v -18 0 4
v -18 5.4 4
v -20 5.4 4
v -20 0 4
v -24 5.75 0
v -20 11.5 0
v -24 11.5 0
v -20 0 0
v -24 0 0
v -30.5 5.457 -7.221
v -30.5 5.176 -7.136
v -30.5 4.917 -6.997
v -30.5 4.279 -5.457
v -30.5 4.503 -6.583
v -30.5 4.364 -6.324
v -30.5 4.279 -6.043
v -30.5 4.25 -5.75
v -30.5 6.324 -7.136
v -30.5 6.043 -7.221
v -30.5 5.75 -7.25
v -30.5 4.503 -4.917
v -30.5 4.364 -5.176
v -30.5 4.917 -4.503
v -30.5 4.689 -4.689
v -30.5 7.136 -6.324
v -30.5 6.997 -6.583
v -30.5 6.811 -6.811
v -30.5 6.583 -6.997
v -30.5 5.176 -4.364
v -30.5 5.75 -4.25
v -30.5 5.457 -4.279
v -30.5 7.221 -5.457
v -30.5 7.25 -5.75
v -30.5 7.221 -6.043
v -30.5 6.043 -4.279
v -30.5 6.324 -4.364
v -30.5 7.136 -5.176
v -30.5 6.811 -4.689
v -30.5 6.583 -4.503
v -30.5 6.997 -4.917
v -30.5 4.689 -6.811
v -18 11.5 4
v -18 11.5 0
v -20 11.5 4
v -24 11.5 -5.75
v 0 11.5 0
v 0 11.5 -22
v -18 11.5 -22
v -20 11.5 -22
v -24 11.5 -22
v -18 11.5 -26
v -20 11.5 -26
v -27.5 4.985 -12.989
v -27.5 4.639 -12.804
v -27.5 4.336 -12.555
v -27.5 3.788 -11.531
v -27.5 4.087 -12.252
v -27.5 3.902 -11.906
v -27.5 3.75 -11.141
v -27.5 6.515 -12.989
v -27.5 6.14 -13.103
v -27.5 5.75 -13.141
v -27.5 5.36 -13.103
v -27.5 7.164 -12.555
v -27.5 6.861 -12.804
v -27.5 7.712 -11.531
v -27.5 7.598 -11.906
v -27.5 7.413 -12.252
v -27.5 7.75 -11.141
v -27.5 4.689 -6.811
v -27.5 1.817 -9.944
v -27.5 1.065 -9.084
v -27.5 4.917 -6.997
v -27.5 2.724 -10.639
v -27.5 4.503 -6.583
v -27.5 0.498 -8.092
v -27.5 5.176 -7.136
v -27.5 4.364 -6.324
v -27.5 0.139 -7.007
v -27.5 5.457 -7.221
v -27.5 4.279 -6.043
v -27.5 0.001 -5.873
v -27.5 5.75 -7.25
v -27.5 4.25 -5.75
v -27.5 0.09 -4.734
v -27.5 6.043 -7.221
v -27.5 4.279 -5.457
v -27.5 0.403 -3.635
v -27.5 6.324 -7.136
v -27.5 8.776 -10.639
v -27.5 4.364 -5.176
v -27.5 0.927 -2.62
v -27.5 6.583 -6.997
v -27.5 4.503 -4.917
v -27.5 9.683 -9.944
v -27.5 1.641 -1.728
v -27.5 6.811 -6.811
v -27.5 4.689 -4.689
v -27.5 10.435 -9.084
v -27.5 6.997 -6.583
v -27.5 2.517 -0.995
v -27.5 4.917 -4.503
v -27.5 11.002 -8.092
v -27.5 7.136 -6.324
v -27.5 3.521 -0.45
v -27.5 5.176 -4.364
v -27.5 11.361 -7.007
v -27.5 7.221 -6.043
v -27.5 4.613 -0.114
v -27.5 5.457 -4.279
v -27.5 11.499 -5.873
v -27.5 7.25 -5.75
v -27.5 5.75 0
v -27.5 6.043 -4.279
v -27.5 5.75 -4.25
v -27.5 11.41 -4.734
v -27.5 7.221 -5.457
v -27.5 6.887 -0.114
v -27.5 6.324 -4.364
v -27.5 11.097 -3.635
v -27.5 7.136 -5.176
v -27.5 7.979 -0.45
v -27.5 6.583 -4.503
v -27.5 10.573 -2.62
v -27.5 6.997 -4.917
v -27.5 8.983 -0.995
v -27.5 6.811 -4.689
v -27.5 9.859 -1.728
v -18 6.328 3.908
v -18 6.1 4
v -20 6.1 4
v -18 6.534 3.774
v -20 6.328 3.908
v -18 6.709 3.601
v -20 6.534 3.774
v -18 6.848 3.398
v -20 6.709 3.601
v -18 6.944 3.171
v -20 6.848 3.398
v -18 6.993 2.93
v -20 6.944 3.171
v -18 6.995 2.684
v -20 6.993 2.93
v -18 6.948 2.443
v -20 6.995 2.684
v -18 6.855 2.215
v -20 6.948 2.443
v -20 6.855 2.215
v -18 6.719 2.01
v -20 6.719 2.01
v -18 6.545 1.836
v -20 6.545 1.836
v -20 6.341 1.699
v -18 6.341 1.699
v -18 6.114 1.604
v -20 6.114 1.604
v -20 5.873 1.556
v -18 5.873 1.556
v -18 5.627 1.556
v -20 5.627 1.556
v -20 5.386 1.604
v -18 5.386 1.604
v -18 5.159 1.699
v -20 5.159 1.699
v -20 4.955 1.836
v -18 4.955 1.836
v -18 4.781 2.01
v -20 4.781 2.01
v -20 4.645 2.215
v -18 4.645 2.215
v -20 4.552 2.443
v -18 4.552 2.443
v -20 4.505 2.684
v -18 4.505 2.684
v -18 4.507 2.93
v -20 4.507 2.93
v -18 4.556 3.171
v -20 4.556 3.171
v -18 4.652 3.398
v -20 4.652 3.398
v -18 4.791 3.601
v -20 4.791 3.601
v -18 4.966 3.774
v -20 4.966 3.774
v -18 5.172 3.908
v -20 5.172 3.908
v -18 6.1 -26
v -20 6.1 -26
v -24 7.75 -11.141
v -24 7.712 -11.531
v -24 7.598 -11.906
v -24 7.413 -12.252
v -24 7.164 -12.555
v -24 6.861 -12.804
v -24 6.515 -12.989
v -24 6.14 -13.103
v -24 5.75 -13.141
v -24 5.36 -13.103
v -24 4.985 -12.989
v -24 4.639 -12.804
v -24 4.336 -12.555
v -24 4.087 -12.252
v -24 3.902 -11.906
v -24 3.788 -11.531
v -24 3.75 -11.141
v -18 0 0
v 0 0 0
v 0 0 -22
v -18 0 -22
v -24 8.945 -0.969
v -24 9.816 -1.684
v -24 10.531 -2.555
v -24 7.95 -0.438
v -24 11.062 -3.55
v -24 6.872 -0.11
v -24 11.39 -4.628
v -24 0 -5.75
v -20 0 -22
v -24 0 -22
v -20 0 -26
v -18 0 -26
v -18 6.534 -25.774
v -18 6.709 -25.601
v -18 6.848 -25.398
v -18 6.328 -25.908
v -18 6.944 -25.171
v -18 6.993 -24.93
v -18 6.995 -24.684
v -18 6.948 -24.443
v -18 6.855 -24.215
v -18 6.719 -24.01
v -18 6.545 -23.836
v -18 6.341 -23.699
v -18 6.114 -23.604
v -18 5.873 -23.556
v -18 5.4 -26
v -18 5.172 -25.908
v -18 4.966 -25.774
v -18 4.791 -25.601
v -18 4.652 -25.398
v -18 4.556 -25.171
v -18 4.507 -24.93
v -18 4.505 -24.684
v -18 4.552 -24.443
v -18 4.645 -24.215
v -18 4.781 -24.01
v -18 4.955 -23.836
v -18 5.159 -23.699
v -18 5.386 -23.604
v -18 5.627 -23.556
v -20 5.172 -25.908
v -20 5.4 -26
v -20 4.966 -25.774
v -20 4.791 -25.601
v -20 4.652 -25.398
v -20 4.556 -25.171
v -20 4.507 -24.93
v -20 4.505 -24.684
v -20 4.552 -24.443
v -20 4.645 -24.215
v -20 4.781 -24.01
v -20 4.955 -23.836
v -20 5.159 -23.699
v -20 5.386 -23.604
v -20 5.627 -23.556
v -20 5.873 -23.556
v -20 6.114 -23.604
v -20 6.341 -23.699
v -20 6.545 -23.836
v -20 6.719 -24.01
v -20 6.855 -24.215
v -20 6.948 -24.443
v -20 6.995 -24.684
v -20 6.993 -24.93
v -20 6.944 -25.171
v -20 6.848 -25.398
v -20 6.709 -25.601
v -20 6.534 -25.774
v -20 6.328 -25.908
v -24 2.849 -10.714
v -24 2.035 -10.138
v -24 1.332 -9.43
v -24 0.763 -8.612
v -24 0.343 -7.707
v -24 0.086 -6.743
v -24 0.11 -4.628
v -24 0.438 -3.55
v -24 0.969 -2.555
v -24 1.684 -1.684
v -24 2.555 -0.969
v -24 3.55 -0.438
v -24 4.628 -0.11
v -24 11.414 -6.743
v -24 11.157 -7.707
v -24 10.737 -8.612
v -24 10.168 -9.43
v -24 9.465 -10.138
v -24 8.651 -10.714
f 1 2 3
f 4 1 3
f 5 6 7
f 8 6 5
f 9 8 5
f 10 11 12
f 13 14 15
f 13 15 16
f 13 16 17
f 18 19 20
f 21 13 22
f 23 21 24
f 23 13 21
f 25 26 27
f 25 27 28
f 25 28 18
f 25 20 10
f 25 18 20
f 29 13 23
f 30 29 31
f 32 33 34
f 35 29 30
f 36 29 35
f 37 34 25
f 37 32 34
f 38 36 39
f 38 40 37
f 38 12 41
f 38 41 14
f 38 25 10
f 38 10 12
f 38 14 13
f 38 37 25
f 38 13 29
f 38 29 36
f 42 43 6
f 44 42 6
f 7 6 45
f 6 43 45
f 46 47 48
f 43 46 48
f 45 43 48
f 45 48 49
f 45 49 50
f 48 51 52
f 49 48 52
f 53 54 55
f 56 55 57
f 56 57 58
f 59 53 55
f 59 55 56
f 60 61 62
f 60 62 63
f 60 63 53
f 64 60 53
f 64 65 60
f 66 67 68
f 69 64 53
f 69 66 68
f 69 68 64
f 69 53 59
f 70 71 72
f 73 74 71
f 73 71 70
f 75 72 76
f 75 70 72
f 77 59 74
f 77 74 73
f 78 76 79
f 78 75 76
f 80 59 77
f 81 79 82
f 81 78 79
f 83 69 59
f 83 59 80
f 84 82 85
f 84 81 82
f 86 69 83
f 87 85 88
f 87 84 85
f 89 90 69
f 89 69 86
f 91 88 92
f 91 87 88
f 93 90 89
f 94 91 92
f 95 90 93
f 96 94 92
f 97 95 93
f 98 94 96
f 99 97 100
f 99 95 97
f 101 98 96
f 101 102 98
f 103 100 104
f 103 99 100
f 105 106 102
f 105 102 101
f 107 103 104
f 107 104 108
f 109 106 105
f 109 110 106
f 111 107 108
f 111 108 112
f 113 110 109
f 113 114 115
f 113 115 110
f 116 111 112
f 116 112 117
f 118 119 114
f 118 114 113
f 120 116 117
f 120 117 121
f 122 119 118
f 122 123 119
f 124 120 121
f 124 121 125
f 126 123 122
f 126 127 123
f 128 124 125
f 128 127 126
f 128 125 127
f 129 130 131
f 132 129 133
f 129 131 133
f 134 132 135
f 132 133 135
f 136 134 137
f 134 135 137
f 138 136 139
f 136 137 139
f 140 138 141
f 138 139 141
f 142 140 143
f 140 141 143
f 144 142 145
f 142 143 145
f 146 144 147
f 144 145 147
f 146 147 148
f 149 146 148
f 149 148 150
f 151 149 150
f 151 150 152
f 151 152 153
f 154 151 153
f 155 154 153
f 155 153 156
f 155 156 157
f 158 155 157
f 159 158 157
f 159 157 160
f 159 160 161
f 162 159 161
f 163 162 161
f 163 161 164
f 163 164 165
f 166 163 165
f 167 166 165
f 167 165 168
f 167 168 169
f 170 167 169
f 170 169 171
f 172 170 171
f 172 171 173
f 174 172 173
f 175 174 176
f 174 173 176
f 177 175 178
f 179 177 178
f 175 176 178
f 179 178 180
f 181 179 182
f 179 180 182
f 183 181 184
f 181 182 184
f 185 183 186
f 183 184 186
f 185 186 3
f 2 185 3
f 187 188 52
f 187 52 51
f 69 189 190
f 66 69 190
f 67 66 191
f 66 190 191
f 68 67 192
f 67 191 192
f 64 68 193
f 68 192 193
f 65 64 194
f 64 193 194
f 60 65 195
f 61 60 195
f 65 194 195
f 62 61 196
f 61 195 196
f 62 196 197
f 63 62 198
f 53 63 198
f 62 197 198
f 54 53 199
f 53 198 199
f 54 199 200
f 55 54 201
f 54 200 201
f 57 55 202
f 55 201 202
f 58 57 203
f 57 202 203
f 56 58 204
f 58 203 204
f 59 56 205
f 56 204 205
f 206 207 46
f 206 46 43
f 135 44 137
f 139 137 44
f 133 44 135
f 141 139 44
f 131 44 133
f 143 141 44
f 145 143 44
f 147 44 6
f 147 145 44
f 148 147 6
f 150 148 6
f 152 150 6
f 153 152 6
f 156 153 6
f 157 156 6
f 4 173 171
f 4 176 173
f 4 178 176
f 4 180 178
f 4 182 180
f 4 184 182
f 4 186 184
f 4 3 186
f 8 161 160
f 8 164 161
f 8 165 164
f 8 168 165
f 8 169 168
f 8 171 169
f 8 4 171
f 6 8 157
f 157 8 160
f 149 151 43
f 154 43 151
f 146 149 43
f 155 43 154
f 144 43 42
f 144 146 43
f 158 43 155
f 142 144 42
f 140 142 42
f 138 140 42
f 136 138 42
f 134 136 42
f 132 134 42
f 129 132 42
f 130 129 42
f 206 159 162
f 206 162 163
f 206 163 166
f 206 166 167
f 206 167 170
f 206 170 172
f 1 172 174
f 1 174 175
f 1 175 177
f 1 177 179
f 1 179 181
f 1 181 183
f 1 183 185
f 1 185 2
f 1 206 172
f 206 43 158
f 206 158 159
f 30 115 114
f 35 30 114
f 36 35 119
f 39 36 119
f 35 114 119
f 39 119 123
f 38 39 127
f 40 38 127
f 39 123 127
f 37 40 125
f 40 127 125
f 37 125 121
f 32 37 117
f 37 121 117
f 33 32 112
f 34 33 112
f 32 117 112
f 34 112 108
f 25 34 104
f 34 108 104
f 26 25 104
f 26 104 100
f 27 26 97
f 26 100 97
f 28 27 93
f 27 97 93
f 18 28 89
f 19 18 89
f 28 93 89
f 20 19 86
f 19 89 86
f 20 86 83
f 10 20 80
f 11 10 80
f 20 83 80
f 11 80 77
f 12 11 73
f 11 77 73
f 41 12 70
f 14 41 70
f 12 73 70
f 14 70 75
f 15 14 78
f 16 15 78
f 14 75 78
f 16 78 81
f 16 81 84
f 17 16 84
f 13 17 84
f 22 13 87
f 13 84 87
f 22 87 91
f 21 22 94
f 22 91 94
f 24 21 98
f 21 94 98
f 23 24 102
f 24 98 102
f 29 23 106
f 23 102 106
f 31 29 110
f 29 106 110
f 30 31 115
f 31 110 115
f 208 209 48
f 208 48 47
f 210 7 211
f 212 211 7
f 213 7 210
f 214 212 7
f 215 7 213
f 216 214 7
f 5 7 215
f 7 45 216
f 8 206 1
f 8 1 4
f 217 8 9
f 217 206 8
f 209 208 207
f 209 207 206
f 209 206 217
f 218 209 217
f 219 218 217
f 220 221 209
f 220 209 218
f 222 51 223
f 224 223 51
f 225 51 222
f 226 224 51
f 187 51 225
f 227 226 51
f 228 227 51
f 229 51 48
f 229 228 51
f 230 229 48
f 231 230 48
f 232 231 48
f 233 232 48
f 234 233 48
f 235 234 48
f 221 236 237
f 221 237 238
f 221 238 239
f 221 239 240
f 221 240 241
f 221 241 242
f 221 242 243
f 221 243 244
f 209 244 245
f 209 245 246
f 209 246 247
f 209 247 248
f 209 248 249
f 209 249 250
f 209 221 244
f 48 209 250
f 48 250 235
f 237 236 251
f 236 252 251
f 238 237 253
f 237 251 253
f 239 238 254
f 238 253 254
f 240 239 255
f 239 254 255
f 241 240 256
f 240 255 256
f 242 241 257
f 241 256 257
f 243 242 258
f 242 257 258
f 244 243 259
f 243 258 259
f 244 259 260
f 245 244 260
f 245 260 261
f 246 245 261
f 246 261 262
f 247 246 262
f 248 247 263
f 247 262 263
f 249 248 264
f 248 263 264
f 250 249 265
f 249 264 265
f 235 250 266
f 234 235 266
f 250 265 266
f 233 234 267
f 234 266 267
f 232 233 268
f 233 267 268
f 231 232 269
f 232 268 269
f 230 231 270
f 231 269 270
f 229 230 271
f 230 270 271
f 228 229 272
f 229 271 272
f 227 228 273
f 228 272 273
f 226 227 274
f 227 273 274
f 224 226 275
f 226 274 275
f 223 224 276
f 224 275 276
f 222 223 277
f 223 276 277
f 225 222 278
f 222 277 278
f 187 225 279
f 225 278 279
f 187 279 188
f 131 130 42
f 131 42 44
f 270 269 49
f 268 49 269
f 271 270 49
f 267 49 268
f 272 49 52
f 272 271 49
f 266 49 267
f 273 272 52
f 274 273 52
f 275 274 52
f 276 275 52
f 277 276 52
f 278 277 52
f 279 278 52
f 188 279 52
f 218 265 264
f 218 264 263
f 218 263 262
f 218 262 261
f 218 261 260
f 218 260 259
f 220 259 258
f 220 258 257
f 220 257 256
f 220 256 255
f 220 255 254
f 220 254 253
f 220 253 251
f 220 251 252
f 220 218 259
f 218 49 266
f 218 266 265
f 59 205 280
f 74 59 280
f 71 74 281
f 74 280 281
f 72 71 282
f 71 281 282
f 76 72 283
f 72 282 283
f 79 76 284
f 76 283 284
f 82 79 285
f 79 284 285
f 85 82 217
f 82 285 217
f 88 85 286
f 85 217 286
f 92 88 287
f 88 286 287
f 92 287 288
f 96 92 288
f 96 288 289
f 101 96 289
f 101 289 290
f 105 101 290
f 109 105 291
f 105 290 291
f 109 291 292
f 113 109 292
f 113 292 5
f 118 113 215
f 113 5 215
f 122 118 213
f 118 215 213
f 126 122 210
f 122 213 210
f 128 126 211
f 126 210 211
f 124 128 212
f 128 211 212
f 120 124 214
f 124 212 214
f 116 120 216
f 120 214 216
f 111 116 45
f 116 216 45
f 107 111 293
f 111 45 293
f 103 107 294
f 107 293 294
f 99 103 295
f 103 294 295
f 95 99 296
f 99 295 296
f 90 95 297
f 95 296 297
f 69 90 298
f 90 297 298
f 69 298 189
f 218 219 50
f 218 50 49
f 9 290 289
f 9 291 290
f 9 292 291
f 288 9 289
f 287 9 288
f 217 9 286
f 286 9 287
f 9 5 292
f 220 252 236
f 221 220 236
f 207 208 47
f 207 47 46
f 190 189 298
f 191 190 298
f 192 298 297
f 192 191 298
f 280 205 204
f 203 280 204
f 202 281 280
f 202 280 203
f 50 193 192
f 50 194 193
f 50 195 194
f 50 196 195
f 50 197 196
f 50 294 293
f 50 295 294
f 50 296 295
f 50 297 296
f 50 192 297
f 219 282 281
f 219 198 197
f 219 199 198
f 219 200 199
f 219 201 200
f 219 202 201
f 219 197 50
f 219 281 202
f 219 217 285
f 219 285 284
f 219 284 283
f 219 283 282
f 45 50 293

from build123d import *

# Parameters (mm, degrees)
BOSS_EXTRUDE1_DEPTH = 11.5
BOSS_EXTRUDE2_DEPTH = 3.5
SKETCH4_R           = 1.5
BOSS_EXTRUDE3_DEPTH = 3
SKETCH5_R           = 1.25
CUT_EXTRUDE1_DEPTH  = 3.5


with BuildPart() as part:
    # Sketch1 → Boss-Extrude1 (new body)
    with BuildSketch(Plane(origin=(0, 0, 0), x_dir=(1, 0, 0), z_dir=(0, 1, 0))):
        Polygon((-20, 0), (-24, 0), (-24, 22), (-20, 22), (-20, 26), (-18, 26), (-18, 22), (0, 22), (0, 0), (-18, 0), (-18, -4), (-20, -4), align=None)
    extrude(amount=BOSS_EXTRUDE1_DEPTH)

    # Sketch2 → Boss-Extrude2 (add)
    with BuildSketch(Plane.ZY.offset(24)):
        with BuildLine():
            ThreePointArc((-11.140964663, 3.75), (0, 5.75), (-11.140964663, 7.75))
            ThreePointArc((-11.140964663, 7.75), (-13.140964663, 5.75), (-11.140964663, 3.75))
        make_face()
    extrude(amount=BOSS_EXTRUDE2_DEPTH)

    # Sketch4 → Boss-Extrude3 (add)
    with BuildSketch(Plane.ZY.offset(27.5)):
        with Locations((-5.75, 5.75)):
            Circle(SKETCH4_R)
    extrude(amount=BOSS_EXTRUDE3_DEPTH)

    # Sketch5 → Cut-Extrude1 (cut)
    with BuildSketch(Plane.ZY.offset(20)):
        with Locations((-24.8, 5.75)):
            Circle(SKETCH5_R)
        with Locations((2.8, 5.75)):
            Circle(SKETCH5_R)
    extrude(amount=-CUT_EXTRUDE1_DEPTH, mode=Mode.SUBTRACT)


solid = part.part
